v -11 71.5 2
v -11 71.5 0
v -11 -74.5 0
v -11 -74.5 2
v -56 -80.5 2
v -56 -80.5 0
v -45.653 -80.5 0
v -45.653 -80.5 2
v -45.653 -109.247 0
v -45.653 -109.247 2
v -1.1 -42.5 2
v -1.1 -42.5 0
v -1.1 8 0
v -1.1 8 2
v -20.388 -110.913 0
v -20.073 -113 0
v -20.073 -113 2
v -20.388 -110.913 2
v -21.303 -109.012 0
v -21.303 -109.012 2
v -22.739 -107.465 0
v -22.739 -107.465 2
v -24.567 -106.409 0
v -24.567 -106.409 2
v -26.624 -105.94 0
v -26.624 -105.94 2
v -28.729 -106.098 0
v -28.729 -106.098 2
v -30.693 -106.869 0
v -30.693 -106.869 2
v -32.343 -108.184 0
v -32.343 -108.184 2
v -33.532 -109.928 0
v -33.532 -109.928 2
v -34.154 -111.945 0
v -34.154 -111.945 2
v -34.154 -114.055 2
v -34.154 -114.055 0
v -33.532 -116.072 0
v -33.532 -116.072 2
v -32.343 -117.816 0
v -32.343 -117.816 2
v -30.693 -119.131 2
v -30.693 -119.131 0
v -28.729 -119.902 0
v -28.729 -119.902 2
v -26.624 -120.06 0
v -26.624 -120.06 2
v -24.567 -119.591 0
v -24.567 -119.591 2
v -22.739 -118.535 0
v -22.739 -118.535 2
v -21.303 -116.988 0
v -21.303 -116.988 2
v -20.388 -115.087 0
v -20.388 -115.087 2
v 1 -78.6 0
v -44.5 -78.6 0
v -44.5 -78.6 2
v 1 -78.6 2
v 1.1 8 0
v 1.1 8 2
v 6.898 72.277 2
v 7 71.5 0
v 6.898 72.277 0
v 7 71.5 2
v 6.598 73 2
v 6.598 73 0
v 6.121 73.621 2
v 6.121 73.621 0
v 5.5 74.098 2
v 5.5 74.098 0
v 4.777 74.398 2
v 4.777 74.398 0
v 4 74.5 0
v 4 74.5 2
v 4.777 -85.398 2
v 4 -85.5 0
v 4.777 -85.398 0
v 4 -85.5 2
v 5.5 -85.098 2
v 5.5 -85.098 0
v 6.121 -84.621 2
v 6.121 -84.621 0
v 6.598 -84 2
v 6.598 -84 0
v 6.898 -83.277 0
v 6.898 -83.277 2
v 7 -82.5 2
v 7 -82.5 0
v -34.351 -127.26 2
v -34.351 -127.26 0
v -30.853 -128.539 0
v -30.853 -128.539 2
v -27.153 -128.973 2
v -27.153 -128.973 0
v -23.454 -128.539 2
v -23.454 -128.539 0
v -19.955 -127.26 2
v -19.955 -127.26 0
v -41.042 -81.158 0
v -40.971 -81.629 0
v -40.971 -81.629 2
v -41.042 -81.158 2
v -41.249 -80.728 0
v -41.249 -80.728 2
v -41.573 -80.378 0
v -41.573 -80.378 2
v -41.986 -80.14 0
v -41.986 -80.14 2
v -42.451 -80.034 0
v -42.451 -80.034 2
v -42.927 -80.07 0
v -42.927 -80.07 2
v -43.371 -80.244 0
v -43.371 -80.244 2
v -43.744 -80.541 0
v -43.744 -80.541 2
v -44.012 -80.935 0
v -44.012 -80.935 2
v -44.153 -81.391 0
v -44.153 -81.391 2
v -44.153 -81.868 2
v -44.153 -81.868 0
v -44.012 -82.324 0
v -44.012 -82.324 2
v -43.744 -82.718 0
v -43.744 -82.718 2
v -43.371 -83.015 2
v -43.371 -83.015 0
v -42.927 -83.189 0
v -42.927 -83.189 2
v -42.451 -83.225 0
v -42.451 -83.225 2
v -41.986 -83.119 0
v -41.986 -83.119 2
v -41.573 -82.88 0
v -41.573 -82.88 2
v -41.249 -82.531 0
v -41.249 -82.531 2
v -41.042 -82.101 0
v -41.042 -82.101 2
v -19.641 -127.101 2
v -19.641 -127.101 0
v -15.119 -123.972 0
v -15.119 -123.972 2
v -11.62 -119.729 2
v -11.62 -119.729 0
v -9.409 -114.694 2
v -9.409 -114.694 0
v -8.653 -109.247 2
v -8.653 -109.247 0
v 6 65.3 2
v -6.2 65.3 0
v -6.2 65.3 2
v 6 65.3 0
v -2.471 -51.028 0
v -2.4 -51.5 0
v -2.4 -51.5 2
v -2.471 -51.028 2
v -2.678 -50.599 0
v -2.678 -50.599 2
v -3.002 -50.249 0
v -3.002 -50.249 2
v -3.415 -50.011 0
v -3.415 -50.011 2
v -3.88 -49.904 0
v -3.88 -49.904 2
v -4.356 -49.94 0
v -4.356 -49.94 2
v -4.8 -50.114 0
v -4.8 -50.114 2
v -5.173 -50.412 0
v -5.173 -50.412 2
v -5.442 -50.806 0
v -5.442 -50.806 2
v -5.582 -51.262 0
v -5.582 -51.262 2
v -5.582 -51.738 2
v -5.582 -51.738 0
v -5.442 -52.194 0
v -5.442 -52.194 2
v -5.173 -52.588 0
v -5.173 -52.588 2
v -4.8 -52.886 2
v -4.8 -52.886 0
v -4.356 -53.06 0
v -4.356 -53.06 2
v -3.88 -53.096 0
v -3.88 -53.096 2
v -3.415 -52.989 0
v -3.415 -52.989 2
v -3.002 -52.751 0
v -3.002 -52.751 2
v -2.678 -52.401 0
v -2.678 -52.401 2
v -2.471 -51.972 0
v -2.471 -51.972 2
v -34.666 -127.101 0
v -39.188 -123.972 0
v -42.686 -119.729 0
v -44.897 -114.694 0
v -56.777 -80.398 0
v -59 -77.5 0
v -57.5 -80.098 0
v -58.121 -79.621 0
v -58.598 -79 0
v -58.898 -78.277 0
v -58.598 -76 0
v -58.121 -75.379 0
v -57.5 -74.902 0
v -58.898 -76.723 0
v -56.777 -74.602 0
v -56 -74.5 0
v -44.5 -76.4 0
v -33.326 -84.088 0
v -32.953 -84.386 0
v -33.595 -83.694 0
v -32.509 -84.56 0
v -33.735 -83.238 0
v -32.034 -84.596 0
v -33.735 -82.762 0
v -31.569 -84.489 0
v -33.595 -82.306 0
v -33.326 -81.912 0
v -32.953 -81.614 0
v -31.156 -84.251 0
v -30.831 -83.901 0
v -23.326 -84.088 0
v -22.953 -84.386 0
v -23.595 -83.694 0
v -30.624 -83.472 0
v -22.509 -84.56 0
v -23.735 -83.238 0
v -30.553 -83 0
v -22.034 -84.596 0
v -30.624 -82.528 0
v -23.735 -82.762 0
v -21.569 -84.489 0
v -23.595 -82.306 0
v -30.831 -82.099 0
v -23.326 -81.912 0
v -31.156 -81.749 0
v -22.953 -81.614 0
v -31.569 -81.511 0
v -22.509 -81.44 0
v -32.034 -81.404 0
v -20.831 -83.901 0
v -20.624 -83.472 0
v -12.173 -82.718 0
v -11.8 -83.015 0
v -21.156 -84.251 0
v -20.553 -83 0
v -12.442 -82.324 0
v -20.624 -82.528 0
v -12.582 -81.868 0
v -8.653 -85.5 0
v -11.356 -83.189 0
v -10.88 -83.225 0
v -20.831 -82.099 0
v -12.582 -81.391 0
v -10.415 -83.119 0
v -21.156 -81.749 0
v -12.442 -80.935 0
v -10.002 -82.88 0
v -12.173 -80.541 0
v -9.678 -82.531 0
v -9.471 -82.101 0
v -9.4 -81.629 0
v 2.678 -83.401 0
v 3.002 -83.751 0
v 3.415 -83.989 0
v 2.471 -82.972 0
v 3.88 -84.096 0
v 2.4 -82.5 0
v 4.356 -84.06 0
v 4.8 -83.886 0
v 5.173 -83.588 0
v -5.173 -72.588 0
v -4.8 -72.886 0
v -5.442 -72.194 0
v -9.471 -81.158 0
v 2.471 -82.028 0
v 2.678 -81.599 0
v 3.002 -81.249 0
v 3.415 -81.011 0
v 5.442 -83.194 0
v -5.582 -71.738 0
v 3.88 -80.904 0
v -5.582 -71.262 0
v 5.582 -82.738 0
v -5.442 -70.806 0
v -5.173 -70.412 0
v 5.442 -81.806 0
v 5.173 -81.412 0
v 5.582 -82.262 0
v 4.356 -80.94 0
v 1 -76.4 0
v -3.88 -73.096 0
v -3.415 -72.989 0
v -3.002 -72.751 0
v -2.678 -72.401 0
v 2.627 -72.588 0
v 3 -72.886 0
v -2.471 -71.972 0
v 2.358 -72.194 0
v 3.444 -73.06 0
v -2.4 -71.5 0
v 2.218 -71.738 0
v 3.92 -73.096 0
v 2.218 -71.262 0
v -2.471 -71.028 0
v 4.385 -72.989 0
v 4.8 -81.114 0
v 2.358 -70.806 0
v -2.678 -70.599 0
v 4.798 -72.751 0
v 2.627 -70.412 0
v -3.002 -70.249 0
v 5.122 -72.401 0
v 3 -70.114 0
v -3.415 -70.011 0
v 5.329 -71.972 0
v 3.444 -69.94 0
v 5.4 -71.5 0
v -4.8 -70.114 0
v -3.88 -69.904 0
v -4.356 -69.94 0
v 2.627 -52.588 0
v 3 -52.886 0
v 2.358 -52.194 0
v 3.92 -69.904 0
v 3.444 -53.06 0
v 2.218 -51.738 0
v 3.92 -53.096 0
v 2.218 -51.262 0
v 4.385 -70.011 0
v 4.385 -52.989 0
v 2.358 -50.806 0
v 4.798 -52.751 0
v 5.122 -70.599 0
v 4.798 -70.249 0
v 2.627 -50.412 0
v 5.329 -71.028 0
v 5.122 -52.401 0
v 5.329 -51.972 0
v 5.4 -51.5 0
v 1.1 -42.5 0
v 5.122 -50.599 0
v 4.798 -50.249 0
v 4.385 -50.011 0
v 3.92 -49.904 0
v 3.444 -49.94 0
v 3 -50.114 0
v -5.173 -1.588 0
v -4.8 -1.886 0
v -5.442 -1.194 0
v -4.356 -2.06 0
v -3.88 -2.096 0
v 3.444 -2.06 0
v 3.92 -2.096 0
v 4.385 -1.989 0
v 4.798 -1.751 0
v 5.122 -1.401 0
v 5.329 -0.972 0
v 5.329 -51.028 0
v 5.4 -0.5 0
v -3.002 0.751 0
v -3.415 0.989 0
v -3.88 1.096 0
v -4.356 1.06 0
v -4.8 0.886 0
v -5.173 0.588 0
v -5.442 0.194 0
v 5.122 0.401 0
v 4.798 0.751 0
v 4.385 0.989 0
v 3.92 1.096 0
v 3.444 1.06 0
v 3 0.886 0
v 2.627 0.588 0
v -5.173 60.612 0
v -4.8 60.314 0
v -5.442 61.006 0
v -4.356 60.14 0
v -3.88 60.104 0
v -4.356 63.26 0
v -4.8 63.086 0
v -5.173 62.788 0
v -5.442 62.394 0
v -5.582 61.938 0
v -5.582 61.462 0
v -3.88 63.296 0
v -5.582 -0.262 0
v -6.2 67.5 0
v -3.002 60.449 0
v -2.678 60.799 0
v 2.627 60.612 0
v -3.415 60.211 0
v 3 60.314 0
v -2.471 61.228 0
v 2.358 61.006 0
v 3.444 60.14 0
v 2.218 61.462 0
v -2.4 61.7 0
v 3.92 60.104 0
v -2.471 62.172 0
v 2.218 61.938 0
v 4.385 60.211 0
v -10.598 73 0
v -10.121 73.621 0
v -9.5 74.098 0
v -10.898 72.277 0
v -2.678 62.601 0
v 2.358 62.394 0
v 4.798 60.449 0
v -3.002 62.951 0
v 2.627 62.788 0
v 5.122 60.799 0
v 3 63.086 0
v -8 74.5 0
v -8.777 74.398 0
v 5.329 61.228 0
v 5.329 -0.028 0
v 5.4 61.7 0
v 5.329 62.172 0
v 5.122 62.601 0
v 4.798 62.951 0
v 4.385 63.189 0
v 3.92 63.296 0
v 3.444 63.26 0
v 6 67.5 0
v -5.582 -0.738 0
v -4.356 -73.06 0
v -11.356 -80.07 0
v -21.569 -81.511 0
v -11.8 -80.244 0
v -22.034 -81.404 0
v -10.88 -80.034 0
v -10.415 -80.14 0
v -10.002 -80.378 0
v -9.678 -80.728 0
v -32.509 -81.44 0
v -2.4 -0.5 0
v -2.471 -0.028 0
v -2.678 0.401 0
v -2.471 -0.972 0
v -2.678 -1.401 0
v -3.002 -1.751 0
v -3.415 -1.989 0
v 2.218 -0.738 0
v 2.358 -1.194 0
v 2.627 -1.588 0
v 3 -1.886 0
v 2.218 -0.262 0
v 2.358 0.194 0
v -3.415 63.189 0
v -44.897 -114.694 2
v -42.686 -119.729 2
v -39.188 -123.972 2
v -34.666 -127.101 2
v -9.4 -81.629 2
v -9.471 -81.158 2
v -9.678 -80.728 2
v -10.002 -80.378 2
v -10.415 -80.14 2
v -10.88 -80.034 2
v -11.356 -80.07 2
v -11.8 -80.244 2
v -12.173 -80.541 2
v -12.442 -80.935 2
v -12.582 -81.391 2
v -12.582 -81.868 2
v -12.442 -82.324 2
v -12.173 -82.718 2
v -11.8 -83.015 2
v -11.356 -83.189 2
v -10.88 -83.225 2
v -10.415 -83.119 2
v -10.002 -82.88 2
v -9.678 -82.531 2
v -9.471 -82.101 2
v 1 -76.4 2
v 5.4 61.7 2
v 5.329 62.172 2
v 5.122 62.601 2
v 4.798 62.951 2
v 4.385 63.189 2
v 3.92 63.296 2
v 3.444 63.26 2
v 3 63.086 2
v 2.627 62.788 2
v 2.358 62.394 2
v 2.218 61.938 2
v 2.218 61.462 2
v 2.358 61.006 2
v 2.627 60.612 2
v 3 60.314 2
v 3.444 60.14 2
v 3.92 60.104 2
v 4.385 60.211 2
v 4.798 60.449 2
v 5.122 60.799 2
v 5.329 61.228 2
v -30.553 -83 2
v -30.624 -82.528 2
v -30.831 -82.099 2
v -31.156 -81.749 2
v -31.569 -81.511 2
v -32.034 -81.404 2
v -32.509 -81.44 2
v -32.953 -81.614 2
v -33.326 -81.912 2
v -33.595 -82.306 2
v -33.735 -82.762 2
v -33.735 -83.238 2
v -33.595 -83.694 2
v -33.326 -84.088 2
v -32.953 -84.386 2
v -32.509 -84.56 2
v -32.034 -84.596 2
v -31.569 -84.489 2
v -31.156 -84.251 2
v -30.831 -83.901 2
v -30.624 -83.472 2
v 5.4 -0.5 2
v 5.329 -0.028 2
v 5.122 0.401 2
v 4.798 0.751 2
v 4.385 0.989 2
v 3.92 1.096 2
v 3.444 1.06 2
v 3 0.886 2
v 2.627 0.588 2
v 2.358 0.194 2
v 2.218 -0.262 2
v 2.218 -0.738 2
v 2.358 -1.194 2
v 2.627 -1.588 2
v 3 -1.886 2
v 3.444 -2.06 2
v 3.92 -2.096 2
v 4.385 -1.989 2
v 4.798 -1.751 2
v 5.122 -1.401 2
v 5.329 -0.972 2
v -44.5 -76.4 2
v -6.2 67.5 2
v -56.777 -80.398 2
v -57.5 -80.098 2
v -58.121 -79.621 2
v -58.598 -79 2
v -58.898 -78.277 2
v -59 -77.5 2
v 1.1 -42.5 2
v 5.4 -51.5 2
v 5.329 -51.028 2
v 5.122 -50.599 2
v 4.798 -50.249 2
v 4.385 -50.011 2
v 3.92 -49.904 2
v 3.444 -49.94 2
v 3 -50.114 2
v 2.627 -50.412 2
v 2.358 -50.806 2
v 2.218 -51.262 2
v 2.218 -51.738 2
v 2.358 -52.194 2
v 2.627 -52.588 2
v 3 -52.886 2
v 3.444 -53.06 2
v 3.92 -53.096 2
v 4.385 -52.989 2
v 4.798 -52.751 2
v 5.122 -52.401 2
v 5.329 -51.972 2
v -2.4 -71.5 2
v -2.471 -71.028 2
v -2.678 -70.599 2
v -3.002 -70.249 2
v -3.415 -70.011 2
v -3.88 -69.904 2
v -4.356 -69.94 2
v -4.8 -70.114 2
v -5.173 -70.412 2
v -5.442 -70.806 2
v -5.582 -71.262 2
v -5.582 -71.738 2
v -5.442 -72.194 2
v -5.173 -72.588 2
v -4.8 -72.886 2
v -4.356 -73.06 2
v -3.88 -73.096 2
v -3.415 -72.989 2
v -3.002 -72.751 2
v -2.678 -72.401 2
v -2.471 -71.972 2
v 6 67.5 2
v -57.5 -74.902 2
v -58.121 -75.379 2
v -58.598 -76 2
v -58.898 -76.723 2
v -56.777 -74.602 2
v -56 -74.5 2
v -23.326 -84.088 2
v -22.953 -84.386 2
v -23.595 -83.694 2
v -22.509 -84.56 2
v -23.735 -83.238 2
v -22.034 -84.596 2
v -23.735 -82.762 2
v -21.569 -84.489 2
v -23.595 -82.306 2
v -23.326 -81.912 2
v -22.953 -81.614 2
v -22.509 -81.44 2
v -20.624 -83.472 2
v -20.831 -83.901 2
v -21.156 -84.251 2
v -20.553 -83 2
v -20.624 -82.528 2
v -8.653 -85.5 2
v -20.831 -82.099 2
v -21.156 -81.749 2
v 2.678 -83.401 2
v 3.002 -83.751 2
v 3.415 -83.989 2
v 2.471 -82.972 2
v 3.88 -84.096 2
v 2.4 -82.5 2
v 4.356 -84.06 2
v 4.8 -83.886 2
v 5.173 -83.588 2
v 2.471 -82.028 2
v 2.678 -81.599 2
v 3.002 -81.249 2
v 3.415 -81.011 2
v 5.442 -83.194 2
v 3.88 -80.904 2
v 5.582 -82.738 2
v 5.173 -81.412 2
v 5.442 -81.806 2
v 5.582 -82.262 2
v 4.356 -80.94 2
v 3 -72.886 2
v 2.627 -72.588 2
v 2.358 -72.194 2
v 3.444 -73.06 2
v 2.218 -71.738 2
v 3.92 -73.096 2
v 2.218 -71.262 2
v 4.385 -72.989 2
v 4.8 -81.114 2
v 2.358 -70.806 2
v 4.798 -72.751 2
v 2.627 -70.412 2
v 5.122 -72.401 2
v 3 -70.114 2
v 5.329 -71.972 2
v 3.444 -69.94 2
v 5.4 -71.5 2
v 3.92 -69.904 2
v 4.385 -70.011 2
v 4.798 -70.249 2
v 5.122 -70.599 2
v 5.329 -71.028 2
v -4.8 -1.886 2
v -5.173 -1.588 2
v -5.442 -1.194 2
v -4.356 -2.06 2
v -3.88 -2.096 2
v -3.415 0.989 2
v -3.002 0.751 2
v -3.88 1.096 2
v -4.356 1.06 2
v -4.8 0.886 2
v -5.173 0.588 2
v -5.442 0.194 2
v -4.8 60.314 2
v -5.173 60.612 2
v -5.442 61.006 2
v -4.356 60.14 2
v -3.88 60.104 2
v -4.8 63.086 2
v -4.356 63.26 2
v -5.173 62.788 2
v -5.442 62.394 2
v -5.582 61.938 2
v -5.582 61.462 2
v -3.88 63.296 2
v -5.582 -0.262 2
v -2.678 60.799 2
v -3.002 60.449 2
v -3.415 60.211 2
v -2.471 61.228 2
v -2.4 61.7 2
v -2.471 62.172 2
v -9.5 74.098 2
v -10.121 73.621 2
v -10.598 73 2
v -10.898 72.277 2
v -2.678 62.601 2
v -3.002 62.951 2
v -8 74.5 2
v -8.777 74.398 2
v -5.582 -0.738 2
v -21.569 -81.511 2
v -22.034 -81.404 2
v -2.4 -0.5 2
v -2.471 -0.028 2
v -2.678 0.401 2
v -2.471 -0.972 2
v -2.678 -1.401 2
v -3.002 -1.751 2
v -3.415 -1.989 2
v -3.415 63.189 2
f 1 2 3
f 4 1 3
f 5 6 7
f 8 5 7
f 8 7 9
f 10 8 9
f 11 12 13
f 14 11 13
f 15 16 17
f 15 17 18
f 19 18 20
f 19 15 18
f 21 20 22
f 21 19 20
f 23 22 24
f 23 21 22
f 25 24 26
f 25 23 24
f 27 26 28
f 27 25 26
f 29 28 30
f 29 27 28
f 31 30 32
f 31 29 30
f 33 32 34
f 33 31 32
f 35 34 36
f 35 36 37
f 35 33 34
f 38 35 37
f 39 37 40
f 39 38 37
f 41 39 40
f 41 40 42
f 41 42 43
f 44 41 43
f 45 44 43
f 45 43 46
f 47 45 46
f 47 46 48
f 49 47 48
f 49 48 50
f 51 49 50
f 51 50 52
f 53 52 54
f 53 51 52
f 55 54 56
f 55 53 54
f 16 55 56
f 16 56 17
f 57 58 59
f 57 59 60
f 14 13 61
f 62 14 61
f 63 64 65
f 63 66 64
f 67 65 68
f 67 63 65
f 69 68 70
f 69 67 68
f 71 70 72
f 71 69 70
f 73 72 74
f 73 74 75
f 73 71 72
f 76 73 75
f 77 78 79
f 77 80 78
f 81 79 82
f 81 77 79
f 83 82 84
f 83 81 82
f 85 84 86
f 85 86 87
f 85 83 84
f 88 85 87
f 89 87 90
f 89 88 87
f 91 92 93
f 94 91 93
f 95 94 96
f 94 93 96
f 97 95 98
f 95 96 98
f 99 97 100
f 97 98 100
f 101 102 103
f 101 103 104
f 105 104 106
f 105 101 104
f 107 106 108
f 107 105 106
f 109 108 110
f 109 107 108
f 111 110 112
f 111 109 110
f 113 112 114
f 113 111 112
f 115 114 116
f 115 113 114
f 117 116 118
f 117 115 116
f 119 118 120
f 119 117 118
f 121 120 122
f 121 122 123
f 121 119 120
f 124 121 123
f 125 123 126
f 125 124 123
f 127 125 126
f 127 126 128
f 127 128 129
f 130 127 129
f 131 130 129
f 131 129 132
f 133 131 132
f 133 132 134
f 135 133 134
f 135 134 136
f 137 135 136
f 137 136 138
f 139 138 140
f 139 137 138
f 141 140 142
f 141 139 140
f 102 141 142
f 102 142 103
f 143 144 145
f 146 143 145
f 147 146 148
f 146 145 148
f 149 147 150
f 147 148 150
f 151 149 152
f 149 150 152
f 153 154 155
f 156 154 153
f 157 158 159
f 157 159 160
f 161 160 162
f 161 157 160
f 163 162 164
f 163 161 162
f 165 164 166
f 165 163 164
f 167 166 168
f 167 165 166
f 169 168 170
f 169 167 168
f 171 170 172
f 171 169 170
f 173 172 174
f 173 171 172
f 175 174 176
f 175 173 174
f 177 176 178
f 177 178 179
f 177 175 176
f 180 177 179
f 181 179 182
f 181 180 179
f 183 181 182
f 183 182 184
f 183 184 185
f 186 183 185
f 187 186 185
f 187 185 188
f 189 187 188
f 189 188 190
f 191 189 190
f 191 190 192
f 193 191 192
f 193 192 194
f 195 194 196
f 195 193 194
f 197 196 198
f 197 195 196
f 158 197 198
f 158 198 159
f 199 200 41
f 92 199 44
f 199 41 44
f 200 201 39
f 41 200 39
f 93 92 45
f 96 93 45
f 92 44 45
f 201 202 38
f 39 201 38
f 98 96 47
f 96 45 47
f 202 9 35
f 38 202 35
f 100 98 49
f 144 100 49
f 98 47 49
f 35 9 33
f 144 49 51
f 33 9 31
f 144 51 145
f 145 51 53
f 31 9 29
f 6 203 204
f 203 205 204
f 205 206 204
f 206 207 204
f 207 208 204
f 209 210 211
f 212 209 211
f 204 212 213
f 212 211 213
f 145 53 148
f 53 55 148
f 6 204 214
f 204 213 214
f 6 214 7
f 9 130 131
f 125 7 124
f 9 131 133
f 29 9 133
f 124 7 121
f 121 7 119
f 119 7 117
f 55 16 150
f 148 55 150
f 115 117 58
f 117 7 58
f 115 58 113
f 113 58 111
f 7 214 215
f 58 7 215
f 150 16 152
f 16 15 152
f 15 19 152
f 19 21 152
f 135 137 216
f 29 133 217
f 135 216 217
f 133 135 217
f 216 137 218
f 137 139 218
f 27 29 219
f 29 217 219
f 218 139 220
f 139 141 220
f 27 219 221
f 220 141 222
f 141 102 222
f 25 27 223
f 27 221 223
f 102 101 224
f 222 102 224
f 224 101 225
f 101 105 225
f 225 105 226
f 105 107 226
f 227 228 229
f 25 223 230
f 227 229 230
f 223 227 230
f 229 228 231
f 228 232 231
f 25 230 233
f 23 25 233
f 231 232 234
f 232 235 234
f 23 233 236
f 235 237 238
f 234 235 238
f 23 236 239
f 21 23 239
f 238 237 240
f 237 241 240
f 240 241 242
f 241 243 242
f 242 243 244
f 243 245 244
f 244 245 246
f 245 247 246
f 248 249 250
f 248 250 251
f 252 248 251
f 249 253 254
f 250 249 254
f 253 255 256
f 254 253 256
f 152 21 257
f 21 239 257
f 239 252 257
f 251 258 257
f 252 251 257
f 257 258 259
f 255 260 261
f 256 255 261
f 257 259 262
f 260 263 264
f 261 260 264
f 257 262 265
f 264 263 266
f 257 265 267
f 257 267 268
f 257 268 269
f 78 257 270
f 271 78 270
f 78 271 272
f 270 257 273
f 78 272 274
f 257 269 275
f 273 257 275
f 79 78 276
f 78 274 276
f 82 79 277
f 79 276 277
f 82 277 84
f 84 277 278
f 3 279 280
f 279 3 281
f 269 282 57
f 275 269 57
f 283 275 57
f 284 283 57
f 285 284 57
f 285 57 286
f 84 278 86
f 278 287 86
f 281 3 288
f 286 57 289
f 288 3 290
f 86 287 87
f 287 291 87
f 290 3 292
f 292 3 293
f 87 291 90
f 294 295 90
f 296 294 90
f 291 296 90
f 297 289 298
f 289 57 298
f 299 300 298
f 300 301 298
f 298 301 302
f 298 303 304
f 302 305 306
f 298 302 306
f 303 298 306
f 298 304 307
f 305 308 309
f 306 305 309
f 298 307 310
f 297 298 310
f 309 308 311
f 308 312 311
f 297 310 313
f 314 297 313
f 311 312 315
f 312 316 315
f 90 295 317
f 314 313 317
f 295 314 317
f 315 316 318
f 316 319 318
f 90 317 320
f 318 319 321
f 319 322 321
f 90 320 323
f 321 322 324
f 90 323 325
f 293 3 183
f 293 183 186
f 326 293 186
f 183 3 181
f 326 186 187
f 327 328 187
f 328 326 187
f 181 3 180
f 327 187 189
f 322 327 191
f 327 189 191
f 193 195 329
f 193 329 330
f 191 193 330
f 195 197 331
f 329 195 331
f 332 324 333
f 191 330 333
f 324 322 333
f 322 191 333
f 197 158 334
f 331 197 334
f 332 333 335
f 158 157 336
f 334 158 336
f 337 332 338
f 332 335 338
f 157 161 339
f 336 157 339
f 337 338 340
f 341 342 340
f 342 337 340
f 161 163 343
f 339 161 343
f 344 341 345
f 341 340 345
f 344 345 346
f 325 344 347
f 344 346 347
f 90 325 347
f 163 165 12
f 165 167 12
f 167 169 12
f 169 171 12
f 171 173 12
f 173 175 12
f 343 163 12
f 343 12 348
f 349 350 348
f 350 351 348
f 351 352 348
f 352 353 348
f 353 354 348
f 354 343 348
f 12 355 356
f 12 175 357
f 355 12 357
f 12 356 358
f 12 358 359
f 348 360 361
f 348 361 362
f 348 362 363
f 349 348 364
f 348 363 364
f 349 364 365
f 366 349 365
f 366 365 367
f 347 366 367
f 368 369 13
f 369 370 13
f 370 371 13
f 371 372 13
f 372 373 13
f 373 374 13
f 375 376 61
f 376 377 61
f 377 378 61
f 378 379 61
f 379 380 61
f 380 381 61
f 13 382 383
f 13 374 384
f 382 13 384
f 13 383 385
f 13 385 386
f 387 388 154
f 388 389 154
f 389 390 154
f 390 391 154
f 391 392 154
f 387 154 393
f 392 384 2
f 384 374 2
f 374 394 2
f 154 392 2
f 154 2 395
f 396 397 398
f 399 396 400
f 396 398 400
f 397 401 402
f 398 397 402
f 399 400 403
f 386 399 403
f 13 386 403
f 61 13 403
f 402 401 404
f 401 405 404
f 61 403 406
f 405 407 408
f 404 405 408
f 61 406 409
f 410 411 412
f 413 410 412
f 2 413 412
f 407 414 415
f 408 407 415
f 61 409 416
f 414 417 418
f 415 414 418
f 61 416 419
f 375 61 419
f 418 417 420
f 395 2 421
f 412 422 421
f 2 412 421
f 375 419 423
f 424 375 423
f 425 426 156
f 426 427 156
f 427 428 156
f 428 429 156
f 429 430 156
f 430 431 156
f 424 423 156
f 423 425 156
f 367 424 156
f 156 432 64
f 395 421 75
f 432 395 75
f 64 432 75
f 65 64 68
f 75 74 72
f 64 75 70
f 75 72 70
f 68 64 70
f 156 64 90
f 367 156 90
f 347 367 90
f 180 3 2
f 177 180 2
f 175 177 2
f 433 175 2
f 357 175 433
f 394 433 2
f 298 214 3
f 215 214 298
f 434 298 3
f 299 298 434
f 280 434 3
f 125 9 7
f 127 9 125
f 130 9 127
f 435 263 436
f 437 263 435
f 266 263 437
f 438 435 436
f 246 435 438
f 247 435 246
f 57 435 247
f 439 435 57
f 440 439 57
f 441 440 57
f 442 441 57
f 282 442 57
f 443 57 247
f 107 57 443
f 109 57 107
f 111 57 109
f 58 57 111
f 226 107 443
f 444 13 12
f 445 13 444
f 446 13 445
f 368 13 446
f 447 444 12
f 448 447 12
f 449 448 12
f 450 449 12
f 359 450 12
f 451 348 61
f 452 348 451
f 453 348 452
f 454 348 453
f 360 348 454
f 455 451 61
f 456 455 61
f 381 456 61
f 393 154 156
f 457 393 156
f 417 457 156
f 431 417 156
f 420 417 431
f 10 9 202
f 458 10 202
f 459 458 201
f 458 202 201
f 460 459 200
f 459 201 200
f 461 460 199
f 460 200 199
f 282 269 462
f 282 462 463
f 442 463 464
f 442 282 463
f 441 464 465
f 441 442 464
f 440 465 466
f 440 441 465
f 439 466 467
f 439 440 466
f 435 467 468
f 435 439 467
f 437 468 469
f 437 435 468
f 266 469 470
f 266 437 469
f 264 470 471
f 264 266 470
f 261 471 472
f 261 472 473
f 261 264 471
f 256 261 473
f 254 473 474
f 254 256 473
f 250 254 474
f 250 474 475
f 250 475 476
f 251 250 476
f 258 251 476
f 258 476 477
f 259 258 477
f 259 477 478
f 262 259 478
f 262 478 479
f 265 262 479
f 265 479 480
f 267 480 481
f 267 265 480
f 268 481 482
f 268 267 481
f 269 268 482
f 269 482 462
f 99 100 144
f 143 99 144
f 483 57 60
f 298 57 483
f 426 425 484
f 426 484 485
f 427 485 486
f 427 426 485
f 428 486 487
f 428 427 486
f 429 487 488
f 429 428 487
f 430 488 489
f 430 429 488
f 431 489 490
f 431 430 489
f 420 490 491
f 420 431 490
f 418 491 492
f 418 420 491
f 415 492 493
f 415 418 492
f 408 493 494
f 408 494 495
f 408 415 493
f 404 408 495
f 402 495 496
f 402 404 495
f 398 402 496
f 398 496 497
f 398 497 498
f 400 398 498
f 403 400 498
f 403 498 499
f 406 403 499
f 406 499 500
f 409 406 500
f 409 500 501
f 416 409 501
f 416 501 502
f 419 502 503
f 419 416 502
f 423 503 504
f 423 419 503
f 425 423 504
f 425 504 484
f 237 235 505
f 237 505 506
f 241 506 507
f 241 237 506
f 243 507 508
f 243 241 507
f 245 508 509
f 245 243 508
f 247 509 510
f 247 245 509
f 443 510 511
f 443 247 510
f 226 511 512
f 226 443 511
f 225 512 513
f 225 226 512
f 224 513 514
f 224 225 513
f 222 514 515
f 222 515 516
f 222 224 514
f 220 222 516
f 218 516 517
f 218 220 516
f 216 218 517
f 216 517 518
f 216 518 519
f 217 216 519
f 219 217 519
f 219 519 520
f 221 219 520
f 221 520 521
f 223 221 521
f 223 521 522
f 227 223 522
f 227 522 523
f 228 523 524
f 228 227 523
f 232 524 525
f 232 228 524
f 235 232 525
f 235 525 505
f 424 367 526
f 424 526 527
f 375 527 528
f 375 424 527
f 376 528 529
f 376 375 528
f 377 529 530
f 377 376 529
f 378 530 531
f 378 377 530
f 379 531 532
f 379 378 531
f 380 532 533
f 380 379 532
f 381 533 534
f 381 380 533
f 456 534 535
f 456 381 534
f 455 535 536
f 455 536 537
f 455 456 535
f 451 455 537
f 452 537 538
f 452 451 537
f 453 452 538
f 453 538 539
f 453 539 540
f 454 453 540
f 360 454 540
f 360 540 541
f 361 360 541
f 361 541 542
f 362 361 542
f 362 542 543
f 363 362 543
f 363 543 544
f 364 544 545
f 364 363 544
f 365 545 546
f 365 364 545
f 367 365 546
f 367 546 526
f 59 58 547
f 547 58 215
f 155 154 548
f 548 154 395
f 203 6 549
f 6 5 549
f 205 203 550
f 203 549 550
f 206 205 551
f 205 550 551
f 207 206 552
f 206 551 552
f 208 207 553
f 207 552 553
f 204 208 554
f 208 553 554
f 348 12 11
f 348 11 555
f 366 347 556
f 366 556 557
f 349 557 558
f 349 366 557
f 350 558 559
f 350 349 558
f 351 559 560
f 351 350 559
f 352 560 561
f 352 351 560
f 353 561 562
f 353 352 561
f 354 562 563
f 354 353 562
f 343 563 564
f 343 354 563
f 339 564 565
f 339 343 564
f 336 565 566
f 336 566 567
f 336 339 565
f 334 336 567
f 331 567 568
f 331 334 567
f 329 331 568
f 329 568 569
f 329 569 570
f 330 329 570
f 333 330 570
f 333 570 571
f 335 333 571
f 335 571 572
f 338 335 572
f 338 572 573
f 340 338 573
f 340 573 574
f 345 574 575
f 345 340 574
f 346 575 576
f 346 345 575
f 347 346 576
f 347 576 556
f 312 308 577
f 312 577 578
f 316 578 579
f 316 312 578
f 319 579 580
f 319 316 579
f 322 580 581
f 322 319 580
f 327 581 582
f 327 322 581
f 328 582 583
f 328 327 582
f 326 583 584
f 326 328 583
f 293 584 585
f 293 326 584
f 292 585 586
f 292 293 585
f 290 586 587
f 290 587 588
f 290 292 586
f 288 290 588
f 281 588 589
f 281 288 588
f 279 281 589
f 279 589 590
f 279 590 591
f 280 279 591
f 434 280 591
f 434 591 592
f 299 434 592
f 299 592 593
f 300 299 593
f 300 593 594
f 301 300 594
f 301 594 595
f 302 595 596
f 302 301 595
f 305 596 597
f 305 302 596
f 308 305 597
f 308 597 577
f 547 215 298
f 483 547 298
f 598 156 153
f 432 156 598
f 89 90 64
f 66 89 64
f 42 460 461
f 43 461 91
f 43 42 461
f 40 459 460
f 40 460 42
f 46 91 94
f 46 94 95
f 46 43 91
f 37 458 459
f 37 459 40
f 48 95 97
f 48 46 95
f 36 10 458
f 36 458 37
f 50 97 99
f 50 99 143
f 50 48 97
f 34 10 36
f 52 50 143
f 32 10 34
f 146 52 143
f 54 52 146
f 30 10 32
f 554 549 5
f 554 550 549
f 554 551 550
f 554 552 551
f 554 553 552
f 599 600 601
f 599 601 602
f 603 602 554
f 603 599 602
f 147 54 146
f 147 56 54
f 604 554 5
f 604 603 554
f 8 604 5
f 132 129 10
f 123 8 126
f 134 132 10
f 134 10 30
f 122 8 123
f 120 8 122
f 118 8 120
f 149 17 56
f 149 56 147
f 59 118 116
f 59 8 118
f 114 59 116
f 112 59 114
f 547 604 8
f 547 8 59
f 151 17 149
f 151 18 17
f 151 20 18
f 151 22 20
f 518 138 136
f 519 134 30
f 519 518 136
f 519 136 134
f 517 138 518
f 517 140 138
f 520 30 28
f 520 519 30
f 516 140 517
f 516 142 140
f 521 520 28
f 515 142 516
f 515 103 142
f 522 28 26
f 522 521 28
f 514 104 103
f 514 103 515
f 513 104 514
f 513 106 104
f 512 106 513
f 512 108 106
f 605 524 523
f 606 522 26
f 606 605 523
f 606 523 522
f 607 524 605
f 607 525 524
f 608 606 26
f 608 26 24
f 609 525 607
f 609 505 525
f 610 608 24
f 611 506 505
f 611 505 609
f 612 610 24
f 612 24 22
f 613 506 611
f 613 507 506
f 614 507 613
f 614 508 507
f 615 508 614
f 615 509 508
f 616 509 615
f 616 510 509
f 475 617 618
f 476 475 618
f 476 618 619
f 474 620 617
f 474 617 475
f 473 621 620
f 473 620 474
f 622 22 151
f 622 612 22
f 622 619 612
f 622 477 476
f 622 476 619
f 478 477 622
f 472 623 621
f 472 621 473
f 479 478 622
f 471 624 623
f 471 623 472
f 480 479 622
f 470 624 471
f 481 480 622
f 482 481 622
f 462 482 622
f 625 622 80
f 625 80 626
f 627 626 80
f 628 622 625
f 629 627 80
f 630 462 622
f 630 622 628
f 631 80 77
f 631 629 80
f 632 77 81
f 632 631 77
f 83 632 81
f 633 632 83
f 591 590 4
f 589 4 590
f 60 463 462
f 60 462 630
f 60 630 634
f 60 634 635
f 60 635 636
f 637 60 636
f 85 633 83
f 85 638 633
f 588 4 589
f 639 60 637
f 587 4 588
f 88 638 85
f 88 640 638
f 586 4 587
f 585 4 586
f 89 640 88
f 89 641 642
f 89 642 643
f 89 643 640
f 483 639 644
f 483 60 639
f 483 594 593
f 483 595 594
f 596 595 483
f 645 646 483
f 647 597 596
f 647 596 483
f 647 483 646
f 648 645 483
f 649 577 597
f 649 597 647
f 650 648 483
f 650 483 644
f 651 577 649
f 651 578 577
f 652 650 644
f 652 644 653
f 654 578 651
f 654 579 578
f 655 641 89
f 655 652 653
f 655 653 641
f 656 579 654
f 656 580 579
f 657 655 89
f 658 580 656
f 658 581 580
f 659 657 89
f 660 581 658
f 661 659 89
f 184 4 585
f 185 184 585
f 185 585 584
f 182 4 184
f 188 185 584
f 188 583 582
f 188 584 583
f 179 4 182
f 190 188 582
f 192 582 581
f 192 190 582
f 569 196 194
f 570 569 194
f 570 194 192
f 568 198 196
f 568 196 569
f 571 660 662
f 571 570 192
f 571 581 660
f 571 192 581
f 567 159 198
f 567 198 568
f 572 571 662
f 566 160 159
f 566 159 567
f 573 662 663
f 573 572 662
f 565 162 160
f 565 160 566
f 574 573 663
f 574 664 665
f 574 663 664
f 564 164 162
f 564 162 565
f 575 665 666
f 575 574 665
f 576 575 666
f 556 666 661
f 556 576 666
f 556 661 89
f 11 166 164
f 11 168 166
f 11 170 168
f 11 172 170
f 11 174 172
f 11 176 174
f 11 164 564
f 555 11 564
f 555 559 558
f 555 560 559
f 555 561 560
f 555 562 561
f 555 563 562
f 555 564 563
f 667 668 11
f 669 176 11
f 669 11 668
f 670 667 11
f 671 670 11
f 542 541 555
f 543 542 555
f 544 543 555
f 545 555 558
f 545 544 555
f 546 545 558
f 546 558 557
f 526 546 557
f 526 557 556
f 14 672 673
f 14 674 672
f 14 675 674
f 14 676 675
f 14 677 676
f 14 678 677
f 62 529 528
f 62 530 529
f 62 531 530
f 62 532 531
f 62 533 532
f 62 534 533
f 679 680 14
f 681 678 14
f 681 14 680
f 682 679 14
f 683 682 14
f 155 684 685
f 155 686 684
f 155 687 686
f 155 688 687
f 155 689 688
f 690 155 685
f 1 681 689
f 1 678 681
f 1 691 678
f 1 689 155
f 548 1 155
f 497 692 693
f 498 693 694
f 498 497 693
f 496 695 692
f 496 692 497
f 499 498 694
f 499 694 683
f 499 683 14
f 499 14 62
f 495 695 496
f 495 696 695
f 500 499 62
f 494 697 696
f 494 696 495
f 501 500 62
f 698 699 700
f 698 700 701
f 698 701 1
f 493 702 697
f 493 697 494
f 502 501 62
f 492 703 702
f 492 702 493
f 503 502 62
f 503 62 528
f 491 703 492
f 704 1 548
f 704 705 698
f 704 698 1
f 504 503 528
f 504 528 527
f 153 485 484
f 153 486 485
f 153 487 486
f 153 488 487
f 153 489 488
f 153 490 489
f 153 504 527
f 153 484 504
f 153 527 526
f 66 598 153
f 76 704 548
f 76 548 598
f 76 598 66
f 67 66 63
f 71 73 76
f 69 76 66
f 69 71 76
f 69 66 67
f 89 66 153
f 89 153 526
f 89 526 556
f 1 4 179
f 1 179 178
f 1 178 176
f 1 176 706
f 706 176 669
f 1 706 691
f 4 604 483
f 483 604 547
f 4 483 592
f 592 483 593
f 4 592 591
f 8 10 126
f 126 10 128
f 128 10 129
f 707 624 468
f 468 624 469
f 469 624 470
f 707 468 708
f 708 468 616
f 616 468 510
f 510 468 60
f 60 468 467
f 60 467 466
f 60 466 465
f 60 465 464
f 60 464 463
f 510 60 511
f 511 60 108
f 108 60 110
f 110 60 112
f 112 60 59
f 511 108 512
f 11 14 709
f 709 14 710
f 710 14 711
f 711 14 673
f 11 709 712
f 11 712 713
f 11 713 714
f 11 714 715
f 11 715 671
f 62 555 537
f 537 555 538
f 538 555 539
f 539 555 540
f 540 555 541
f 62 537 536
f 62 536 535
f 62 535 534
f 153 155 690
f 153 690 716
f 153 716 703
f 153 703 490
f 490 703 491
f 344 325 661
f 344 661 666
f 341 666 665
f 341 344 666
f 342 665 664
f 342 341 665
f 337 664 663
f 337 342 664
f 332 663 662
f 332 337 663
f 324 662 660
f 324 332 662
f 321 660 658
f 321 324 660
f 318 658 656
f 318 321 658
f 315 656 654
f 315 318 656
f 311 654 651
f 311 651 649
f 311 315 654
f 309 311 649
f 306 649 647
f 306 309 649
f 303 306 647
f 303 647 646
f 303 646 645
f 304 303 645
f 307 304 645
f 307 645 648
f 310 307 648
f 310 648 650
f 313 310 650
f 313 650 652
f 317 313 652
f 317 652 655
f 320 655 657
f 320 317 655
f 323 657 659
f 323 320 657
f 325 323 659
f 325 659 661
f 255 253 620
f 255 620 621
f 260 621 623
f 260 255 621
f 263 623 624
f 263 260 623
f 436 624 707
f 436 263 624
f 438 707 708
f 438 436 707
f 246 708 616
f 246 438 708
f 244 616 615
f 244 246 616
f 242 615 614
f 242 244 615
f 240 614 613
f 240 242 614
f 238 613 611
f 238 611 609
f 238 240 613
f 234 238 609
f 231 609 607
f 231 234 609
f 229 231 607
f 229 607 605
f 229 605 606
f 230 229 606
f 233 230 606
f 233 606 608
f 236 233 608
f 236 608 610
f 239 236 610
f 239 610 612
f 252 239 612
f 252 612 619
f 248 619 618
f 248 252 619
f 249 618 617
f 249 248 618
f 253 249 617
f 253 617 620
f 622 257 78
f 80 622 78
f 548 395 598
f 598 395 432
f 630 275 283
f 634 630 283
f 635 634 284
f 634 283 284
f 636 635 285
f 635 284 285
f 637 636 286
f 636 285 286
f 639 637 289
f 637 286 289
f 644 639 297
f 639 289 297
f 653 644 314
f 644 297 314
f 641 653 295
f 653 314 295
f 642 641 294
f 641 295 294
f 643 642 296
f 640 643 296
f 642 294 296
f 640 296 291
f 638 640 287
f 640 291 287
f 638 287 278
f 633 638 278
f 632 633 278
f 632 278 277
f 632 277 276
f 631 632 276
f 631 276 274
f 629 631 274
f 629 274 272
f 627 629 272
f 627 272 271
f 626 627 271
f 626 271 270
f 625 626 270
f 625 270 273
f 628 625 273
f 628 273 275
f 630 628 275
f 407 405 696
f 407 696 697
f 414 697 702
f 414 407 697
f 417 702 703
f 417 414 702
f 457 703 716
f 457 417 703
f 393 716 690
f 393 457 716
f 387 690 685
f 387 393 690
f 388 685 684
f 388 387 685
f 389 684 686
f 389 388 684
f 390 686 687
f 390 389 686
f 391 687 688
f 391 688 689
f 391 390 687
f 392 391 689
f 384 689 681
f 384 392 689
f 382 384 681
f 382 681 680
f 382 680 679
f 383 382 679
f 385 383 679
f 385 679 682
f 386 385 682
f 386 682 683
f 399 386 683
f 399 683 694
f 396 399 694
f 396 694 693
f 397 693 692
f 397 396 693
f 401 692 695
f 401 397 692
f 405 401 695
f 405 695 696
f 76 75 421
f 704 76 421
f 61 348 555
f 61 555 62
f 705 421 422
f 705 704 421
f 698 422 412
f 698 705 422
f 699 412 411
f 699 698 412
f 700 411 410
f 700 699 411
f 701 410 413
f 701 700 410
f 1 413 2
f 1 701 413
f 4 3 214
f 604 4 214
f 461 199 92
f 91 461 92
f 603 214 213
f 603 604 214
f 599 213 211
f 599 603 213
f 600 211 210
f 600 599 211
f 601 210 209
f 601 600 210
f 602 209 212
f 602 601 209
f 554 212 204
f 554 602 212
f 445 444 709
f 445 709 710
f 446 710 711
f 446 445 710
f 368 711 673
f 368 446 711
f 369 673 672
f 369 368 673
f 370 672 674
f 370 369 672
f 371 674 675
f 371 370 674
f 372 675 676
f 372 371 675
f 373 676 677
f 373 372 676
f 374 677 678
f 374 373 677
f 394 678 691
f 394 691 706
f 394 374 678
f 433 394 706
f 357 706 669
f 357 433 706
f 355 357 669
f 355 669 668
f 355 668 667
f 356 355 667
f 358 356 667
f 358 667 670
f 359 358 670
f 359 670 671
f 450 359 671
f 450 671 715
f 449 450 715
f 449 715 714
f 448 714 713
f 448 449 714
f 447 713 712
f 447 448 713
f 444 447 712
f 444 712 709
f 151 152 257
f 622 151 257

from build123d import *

# Parameters (mm, degrees)
SKETCH_1_R          = 1.6
SKETCH_1_R_2        = 7.08
SKETCH_1_W          = 45.5
SKETCH_1_H          = 2.2
SKETCH_1_W_2        = 2.2
SKETCH_1_H_2        = 50.5
SKETCH_1_W_3        = 12.2
EXTRUDE_1_DEPTH     = 2
SKETCH_2_W          = 4
SKETCH_2_H          = 160
CUT_EXTRUDE_1_DEPTH = 10
SKETCH_3_R          = 1.6
CUT_EXTRUDE_2_DEPTH = 10
FILLET_1_R          = 3


with BuildPart() as part:
    # 草图1 → 凸台-拉伸1 (new body)
    with BuildSketch(Plane.XY):
        with BuildLine():
            Line((-8.65326359, -109.246690295), (-8.65326359, -85.5))
            Line((-8.65326359, -85.5), (11, -85.5))
            Line((11, -85.5), (11, 74.5))
            Line((11, 74.5), (-11, 74.5))
            Line((-11, 74.5), (-11, -74.5))
            Line((-11, -74.5), (-59, -74.5))
            Line((-59, -74.5), (-59, -80.5))
            Line((-59, -80.5), (-45.65326359, -80.5))
            Line((-45.65326359, -80.5), (-45.65326359, -109.246690295))
            ThreePointArc((-45.65326359, -109.246690295), (-42.686252119, -119.728927736), (-34.665533413, -127.101073304))
            Line((-34.665533413, -127.101073304), (-34.351105887, -127.259785353))
            ThreePointArc((-34.351105887, -127.259785353), (-27.15326359, -128.973428312), (-19.955421292, -127.259785353))
            Line((-19.955421292, -127.259785353), (-19.640993767, -127.101073304))
            ThreePointArc((-19.640993767, -127.101073304), (-11.620275061, -119.728927736), (-8.65326359, -109.246690295))
        make_face()
        with Locations((-11, -81.629391896)):
            Circle(SKETCH_1_R, mode=Mode.SUBTRACT)
        with Locations((-42.570682945, -81.629391896)):
            Circle(SKETCH_1_R, mode=Mode.SUBTRACT)
        with Locations((-22.15326359, -83)):
            Circle(SKETCH_1_R, mode=Mode.SUBTRACT)
        with Locations((-27.15326359, -113)):
            Circle(SKETCH_1_R_2, mode=Mode.SUBTRACT)
        with Locations((-32.15326359, -83)):
            Circle(SKETCH_1_R, mode=Mode.SUBTRACT)
        with Locations((-21.75, -77.5)):
            Rectangle(SKETCH_1_W, SKETCH_1_H, mode=Mode.SUBTRACT)
        with Locations((3.8, 61.7)):
            Circle(SKETCH_1_R, mode=Mode.SUBTRACT)
        with Locations((-4, -71.5)):
            Circle(SKETCH_1_R, mode=Mode.SUBTRACT)
        with Locations((3.8, -71.5)):
            Circle(SKETCH_1_R, mode=Mode.SUBTRACT)
        with Locations((-4, -51.5)):
            Circle(SKETCH_1_R, mode=Mode.SUBTRACT)
        with Locations((3.8, -51.5)):
            Circle(SKETCH_1_R, mode=Mode.SUBTRACT)
        with Locations((0, -17.25)):
            Rectangle(SKETCH_1_W_2, SKETCH_1_H_2, mode=Mode.SUBTRACT)
        with Locations((-4, -0.5)):
            Circle(SKETCH_1_R, mode=Mode.SUBTRACT)
        with Locations((3.8, -0.5)):
            Circle(SKETCH_1_R, mode=Mode.SUBTRACT)
        with Locations((-4, 61.7)):
            Circle(SKETCH_1_R, mode=Mode.SUBTRACT)
        with Locations((-0.1, 66.4)):
            Rectangle(SKETCH_1_W_3, SKETCH_1_H, mode=Mode.SUBTRACT)
    extrude(amount=EXTRUDE_1_DEPTH)

    # 草图2 → 切除-拉伸1 (cut)
    with BuildSketch(Plane(origin=(0, 0, 0), x_dir=(-1, 0, 0), z_dir=(0, 0, -1))):
        with Locations((-9, -5.5)):
            Rectangle(SKETCH_2_W, SKETCH_2_H)
    extrude(amount=-CUT_EXTRUDE_1_DEPTH, mode=Mode.SUBTRACT)

    # 草图3 → 切除-拉伸2 (cut)
    with BuildSketch(Plane(origin=(0, 0, 0), x_dir=(-1, 0, 0), z_dir=(0, 0, -1))):
        with Locations((-4, -82.5)):
            Circle(SKETCH_3_R)
    extrude(amount=-CUT_EXTRUDE_2_DEPTH, mode=Mode.SUBTRACT)

    # 圆角1
    fillet_1_edges = [part.edges().sort_by_distance(p)[0] for p in [
        (-59, -74.5, 1),
        (-59, -80.5, 1),
        (7, -85.5, 1),
        (-11, 74.5, 1),
        (7, 74.5, 1),
    ]]
    fillet(fillet_1_edges, radius=FILLET_1_R - 0.0001)  # a hair under: the kernel refuses the full size


solid = part.part
